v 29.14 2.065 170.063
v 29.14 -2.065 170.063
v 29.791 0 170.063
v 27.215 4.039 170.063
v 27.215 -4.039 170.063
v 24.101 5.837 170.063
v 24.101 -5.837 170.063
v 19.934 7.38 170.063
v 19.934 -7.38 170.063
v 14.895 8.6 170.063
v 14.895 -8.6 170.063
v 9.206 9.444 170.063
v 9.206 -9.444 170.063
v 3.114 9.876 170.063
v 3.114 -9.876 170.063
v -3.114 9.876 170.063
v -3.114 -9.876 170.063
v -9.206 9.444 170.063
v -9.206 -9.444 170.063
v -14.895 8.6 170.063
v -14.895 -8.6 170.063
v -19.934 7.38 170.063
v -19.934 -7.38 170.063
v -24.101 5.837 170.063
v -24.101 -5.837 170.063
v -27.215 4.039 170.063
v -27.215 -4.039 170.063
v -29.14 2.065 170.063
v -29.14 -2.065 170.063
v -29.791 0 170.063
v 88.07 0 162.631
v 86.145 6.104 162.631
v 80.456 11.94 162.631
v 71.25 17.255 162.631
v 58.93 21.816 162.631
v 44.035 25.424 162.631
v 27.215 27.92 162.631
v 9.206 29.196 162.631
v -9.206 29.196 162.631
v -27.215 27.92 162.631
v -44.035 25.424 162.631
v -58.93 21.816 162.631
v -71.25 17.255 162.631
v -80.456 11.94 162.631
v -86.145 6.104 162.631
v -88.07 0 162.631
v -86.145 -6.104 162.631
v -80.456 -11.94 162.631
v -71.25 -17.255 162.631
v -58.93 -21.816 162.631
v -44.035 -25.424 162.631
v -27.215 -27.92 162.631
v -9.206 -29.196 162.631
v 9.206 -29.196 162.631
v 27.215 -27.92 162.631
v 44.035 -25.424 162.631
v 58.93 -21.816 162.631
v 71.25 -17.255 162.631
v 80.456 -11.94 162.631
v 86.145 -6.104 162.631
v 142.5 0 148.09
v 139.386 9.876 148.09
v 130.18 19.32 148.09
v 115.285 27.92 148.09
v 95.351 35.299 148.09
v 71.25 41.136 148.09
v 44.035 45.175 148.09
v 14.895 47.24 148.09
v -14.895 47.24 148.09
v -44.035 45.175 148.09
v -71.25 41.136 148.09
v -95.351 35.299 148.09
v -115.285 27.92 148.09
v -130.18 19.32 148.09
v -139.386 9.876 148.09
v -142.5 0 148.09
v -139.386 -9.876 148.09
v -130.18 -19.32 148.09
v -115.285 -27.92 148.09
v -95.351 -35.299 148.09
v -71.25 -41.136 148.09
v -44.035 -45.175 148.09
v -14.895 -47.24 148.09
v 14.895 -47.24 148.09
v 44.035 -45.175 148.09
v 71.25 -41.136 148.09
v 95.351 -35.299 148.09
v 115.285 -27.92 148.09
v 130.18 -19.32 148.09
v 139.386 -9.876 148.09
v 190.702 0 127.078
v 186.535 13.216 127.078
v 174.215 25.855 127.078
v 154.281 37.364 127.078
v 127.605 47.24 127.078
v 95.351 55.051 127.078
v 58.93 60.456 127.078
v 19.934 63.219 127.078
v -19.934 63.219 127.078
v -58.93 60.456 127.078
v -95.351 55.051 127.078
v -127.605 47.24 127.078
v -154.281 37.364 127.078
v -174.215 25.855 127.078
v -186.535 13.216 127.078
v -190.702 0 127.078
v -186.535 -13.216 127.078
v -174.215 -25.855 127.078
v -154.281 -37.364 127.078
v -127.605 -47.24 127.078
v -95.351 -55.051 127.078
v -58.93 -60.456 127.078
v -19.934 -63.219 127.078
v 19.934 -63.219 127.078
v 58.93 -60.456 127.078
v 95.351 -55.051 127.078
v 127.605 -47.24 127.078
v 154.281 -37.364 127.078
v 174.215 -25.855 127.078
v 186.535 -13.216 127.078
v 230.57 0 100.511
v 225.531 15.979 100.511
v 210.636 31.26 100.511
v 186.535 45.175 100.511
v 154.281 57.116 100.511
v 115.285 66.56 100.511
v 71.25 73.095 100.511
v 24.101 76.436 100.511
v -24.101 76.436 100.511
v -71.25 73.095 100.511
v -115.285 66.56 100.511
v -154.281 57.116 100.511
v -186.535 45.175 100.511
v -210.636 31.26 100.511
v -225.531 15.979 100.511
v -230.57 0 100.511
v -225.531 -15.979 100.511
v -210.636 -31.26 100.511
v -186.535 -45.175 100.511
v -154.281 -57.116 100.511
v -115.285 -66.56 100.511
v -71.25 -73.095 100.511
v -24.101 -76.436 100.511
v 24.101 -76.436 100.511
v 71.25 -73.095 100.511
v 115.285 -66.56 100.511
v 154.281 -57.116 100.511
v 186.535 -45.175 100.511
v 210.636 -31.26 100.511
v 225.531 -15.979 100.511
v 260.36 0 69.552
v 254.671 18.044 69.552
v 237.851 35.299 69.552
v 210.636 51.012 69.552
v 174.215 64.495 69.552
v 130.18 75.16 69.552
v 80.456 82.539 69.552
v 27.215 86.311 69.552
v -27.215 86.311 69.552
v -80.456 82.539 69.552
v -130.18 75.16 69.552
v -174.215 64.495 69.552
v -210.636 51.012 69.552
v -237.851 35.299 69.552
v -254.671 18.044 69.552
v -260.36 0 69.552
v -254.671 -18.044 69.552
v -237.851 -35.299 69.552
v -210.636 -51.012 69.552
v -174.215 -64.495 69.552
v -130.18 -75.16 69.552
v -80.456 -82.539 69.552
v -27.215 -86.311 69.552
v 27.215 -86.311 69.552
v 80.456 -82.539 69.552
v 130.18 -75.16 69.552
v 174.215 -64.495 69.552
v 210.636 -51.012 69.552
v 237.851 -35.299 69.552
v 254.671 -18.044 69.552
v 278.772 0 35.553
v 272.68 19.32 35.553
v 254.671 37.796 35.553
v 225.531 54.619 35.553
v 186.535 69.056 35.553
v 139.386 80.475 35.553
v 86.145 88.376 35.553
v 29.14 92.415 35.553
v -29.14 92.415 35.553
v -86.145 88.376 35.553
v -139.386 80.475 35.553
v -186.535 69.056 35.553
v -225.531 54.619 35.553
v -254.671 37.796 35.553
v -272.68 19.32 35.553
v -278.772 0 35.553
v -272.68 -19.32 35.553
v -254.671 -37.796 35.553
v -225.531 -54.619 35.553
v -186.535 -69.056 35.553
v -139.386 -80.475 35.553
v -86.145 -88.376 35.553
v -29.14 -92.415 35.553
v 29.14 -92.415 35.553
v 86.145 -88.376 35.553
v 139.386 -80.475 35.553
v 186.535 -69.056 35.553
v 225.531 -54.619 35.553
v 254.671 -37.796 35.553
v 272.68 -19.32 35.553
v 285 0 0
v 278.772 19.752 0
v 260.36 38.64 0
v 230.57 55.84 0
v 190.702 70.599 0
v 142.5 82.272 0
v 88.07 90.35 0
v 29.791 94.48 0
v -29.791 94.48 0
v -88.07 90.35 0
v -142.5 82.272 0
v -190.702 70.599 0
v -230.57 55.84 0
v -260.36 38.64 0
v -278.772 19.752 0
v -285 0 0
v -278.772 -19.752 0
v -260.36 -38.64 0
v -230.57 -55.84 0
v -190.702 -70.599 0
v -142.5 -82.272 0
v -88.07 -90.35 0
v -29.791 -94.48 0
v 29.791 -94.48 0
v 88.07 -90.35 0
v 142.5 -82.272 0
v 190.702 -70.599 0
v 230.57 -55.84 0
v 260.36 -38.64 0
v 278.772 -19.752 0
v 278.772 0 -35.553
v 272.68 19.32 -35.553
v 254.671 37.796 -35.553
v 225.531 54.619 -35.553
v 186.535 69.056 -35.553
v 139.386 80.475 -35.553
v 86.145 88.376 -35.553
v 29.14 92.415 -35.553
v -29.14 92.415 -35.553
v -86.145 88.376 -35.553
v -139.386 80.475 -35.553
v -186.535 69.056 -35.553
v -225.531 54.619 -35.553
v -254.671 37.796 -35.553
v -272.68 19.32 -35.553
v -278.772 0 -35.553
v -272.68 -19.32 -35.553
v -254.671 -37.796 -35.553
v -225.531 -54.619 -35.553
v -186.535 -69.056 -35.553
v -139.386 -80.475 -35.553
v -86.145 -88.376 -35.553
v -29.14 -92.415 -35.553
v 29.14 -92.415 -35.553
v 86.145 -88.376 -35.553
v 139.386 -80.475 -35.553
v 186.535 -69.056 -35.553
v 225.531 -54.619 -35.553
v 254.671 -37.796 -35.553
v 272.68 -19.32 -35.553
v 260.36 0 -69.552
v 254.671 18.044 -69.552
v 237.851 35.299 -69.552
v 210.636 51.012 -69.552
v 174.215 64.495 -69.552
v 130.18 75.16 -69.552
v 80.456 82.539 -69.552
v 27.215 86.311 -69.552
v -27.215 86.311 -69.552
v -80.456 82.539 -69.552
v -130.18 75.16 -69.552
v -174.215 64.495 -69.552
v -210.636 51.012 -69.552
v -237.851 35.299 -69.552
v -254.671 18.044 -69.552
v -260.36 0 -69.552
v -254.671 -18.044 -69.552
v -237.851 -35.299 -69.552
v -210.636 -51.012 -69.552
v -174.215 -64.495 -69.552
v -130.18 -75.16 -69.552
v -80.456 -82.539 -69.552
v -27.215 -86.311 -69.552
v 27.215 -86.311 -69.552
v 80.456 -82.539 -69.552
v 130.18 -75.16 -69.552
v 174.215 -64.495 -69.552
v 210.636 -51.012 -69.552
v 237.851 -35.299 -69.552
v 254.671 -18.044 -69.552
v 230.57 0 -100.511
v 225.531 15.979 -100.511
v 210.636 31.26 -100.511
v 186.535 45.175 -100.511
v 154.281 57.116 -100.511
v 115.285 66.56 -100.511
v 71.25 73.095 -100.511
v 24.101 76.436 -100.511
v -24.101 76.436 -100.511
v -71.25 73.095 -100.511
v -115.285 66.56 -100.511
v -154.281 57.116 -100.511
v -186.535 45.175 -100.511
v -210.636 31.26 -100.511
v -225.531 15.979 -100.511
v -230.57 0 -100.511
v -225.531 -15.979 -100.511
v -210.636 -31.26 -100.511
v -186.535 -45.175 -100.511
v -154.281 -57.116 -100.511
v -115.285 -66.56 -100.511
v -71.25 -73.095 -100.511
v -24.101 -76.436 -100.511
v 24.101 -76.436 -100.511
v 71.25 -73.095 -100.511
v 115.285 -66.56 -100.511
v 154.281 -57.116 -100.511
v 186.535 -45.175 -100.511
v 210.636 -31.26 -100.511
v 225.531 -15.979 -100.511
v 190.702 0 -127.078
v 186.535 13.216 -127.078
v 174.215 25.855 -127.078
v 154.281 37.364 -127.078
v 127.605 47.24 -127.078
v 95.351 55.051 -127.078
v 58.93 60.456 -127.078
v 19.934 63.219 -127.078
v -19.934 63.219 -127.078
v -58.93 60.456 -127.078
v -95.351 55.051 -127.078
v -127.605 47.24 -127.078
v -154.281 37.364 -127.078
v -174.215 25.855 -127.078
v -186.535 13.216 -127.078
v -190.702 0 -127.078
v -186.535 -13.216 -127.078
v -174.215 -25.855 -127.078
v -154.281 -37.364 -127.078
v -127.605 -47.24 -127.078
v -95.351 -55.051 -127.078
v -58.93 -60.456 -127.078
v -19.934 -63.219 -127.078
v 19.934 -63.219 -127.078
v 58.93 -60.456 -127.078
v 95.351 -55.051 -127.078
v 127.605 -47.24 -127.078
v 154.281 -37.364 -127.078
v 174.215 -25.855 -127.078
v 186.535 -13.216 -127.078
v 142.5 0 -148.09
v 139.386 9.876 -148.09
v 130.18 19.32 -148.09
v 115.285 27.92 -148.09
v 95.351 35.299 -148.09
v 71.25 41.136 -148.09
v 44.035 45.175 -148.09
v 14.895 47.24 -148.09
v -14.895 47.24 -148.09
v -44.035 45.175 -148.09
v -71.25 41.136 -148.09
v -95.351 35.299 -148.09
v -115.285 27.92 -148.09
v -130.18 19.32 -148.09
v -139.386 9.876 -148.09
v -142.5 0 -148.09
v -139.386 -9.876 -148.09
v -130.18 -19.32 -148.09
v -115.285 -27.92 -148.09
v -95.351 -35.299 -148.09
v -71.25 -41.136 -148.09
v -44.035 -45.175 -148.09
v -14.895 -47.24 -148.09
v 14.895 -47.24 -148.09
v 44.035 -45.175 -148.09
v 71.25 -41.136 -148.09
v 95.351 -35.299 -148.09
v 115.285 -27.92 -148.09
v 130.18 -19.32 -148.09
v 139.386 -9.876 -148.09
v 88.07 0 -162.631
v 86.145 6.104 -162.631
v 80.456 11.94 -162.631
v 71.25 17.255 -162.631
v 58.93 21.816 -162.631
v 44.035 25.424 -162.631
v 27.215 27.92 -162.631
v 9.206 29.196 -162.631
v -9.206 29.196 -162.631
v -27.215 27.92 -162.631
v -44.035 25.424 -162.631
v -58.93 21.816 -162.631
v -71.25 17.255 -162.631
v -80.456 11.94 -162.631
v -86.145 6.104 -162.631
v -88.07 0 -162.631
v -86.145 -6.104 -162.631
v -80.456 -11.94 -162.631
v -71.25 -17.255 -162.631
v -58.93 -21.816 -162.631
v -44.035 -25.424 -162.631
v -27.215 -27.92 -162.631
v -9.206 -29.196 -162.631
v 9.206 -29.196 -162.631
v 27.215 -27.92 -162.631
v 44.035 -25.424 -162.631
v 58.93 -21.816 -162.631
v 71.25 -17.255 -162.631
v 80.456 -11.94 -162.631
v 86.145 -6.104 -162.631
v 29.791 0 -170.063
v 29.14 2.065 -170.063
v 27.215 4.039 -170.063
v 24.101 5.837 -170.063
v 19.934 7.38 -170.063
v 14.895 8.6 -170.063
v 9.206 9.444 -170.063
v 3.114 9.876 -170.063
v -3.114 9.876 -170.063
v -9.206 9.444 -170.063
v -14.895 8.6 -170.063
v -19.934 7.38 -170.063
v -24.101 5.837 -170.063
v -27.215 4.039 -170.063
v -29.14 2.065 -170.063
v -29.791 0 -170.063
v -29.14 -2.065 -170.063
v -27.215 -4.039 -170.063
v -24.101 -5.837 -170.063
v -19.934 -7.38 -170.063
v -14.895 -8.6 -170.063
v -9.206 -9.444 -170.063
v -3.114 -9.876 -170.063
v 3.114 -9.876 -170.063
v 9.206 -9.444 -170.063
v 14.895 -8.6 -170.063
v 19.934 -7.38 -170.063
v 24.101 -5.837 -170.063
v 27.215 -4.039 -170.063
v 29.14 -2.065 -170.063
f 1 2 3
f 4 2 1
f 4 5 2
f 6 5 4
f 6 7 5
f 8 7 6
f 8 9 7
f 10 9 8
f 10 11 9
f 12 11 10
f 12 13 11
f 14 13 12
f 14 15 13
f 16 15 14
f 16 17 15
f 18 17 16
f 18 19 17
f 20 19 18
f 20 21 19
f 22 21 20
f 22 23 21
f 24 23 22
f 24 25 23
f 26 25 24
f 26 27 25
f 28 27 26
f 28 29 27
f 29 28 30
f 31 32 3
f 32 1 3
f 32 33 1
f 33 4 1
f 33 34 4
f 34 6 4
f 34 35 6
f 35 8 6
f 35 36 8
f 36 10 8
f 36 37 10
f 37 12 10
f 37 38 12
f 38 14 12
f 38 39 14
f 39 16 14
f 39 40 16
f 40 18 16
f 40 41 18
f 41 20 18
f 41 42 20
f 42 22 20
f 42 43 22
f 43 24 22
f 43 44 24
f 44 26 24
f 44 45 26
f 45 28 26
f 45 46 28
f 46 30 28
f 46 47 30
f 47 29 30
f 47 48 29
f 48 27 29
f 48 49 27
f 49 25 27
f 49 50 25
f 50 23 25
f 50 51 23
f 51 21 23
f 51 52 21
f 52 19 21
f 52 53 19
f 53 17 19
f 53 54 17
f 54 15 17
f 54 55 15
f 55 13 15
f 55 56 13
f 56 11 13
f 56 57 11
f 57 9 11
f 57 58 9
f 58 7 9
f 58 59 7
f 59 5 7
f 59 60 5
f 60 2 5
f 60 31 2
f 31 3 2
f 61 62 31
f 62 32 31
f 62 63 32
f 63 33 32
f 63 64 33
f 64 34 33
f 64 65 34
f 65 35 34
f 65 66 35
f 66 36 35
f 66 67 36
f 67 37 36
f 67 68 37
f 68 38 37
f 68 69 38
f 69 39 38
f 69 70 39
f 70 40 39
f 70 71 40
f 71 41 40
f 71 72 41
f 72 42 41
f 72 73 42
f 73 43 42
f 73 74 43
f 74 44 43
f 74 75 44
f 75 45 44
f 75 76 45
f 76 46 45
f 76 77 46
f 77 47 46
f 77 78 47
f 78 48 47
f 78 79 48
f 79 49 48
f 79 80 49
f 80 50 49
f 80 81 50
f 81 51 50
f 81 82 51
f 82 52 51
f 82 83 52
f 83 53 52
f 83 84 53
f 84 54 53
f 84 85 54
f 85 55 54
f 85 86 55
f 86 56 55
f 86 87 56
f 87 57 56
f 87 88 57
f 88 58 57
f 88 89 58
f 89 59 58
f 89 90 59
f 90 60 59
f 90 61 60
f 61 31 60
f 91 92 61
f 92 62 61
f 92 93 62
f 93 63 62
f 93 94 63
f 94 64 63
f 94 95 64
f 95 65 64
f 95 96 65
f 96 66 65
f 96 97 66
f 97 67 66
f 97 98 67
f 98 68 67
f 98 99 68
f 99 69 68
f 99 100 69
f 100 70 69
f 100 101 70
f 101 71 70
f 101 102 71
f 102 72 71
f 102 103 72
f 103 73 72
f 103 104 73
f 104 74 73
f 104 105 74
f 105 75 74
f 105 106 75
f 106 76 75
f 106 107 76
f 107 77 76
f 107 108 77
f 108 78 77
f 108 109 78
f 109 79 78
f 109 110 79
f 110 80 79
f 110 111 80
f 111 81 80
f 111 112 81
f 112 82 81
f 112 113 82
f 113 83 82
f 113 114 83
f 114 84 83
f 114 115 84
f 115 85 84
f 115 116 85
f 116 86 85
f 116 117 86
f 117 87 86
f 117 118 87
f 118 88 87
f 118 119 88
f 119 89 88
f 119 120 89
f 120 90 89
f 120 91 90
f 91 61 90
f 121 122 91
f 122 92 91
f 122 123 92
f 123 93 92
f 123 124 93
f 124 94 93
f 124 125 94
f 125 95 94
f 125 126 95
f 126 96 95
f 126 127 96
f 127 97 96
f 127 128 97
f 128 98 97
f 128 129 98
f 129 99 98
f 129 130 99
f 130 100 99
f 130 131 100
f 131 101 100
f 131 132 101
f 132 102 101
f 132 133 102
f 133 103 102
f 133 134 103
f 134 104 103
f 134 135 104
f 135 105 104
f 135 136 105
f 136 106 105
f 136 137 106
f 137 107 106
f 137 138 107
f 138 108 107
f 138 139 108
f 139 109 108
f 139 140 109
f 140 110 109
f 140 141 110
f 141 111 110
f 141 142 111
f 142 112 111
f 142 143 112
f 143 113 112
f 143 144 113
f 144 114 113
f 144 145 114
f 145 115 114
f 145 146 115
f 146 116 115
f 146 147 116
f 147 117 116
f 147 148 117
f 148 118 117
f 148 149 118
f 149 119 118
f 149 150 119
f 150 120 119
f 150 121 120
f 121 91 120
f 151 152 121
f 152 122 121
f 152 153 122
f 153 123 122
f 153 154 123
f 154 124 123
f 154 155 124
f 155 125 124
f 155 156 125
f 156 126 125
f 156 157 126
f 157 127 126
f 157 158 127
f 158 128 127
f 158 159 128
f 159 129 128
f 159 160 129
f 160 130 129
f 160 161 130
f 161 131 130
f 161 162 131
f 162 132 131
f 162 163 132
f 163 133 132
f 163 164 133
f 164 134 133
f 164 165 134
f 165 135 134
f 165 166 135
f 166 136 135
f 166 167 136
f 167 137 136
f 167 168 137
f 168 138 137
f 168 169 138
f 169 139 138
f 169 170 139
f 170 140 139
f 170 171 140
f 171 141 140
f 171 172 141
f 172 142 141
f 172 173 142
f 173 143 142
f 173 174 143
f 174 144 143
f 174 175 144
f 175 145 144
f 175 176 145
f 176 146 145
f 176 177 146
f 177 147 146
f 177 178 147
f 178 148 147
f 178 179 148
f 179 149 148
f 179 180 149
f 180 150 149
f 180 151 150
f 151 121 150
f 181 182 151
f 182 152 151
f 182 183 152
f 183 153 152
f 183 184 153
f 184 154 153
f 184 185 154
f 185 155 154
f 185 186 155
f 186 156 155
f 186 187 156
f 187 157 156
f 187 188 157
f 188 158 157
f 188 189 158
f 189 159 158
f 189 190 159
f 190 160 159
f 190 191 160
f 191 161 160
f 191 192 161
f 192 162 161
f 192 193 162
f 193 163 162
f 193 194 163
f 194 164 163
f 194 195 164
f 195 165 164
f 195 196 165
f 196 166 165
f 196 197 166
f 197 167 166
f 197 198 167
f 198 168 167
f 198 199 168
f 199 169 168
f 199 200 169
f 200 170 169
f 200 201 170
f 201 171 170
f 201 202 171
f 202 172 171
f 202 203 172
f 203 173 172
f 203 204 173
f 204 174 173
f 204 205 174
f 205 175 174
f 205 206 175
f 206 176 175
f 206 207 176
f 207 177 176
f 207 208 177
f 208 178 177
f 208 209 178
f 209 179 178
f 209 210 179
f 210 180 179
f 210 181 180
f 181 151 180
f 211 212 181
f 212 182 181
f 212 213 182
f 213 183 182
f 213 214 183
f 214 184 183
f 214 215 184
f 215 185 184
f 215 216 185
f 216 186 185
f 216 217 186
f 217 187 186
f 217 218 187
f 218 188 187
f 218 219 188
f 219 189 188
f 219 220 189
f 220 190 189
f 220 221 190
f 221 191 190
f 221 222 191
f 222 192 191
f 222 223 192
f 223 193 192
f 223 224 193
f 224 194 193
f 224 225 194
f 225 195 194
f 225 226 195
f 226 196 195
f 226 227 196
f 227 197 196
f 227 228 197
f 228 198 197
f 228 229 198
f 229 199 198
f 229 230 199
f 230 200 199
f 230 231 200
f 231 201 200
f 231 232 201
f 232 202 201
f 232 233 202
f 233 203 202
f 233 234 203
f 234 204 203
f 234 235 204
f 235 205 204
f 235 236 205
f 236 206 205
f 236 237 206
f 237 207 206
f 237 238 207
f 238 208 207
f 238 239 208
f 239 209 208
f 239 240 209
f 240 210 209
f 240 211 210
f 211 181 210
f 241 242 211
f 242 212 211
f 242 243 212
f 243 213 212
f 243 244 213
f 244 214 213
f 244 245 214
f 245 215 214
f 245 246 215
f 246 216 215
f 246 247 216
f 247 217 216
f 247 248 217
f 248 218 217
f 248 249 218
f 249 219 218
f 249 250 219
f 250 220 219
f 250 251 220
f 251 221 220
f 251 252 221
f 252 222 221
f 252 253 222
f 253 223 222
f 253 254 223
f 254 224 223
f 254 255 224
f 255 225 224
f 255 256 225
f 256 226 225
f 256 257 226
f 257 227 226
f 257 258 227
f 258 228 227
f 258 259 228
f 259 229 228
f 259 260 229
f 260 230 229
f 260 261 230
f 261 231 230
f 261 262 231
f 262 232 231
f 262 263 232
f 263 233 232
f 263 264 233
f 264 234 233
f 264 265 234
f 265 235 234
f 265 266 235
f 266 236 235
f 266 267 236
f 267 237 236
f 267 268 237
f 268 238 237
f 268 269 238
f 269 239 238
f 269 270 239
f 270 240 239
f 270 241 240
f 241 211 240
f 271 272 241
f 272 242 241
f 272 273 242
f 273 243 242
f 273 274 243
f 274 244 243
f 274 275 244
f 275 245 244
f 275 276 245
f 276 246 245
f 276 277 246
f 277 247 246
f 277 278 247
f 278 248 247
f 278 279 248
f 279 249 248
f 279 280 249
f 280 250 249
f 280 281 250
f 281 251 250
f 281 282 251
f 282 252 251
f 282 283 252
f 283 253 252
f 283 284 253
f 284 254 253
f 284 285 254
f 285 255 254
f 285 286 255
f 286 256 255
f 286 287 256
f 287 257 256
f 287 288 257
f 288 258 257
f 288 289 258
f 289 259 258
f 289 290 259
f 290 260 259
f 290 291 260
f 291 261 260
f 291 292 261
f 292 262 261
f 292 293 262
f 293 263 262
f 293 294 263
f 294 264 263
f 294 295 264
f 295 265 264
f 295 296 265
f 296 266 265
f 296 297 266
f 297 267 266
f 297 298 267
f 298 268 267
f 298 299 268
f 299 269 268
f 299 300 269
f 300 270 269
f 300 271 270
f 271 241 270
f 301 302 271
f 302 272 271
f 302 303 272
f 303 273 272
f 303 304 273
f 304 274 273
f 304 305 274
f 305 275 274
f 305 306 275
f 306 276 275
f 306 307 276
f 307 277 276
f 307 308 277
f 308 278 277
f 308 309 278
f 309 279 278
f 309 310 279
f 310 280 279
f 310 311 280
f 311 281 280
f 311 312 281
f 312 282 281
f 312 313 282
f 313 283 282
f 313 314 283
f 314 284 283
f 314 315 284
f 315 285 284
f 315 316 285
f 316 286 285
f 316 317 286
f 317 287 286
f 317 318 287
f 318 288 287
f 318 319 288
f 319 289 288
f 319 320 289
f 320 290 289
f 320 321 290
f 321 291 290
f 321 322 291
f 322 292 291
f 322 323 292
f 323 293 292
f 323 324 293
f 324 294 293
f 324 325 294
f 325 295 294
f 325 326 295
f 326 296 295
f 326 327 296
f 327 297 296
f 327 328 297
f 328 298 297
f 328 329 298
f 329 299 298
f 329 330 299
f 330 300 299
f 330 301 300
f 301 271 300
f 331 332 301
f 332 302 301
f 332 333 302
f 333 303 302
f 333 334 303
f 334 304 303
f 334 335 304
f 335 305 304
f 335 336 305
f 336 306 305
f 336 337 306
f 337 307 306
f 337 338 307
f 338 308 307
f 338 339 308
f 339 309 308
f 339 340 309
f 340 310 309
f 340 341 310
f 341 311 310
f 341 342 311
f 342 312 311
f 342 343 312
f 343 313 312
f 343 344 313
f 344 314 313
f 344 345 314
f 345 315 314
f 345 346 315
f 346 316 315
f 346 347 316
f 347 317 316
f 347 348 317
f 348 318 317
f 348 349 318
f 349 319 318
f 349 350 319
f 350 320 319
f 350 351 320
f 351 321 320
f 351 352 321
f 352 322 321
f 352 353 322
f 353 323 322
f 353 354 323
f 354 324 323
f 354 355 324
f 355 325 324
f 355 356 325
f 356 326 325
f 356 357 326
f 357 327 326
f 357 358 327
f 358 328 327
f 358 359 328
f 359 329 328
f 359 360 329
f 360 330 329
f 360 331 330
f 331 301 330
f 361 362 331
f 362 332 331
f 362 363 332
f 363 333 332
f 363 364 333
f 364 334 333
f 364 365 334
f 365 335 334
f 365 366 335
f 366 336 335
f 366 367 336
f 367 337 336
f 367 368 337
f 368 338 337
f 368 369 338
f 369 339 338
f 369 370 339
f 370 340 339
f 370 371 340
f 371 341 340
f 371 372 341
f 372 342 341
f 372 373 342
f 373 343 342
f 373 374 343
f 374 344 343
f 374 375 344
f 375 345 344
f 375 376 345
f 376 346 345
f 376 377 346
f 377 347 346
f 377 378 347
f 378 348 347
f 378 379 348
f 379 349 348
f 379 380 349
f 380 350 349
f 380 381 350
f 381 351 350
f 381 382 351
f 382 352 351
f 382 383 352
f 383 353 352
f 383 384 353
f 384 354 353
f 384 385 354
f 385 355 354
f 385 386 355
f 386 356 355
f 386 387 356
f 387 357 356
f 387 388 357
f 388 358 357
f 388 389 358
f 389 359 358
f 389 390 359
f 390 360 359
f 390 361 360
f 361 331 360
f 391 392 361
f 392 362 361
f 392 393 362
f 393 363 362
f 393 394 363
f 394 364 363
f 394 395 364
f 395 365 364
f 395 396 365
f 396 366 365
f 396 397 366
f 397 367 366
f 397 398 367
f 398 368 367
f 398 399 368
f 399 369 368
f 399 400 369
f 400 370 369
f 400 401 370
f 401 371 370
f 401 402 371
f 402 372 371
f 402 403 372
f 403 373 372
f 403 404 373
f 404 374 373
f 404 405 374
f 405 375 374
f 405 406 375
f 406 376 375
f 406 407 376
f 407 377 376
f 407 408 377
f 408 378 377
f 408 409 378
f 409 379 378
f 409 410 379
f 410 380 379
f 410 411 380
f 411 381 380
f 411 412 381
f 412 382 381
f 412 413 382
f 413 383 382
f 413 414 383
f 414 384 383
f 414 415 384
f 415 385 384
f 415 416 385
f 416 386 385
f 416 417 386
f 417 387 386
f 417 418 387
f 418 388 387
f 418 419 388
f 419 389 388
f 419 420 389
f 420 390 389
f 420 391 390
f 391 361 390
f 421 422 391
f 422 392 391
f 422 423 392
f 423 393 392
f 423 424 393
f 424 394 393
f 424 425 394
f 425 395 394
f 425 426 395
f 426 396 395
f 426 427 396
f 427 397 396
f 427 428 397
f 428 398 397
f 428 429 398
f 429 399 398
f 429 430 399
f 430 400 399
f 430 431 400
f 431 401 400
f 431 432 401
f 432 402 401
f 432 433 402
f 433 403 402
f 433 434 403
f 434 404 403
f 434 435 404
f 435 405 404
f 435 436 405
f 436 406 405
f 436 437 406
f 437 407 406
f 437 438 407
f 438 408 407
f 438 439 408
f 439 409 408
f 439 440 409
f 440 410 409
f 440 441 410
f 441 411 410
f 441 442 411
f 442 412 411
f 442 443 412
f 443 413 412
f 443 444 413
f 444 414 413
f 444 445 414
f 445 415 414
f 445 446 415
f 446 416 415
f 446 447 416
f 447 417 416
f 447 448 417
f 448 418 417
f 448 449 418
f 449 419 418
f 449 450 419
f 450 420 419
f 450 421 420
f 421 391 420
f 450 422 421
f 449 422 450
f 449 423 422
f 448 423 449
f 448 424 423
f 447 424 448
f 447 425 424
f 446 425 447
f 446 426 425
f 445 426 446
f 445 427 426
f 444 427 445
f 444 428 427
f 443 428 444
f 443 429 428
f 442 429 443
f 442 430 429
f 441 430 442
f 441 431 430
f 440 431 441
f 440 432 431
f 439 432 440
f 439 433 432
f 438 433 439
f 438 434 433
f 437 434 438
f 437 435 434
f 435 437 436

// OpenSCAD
// Generated by SolidPython 1.0.1 on 2020-07-29 00:46:51


scale(v = [15, 5, 9]) {
	sphere(r = 19);
}
/***********************************************
*********      SolidPython code:      **********
************************************************
 
# import packages: SolidPython
from solid import *
from solid.utils import *
from itertools import chain, combinations, permutations


class Resize:

    def __init__(self, scad_file):
        self.scad_file = scad_file
        #self.scad_file = import_scad(scad_file)
        # cone/cylinder param:
        self.r1 = 0
        self.r2 = 0
        self.h = 0
        # rectangular prism param:
        self.w = 0
        self.l = 0
        # ellipse param:
        self.r = 0

    # import OpenScad code (file name corresponds to shape)


    # classify shape + parameters
    def assign(self, param1, param2, param3):
        if self.scad_file == 'cone.scad':
            self.r1 = param1
            self.r2 = param2
            self.h = param3
        elif self.scad_file == 'cylinder.scad':
            self.r1 = param1
            self.r2 = param2
            self.h = param3
        elif self.scad_file == 'rectangularPrism.scad':
            self.h = param1
            self.l = param2
            self.w = param3
        else:
            self.r = param1
            self.h = param2

    # resize parameters
    def iterate(self):
        x = range(3, 20, 2)
        i = 1
        if self.scad_file == 'cone.scad':
            tempList = list(permutations(x, 2))
            for temp in tempList:
                param1 = temp[0]
                param2 = temp[1]
                filepath = 'produced_scad_files/' + 'cone' + str(param1) + '_' + str(param2) + '_' + '.scad'
                scad_render_to_file(cylinder(h=param1, r1=param2, r2=0), filepath)

        elif self.scad_file == 'cylinder.scad':
            tempList = list(permutations(x, 3))
            for temp in tempList:
                param1 = temp[0]
                param2 = temp[1]
                filepath = 'produced_scad_files/' + 'cylinder' + str(param1) + '_' + str(param2) + '_' + '.scad'
                scad_render_to_file(cylinder(h=param1, r1=param2, r2=param2), filepath)

        elif self.scad_file == 'rectangularPrism.scad':
            tempList = list(permutations(x, 3))
            for temp in tempList:
                param1 = temp[0]
                param2 = temp[1]
                param3 = temp[2]
                filepath = 'produced_scad_files/' + 'rectangularPrism' + str(param1) + '_' + str(param2) + '_' + str(
                    param3) + '.scad'
                scad_render_to_file(cube(size=(param1, param2, param3)), filepath)

        elif self.scad_file == 'ellipse.scad':
            tempList = list(permutations(x, 4))
            for temp in tempList:
                param1 = temp[0]
                param2 = temp[1]
                param3 = temp[2]
                param4 = temp[3]
                filepath = 'produced_scad_files/' + 'ellipse' + str(param1) + '_' + str(param2) + '_' + str(param3) + '_' + str(param4) + '.scad'
                scad_render_to_file(scale([param1, param2, param3])(sphere(r=param4)), filepath)

    def render_to_scadfile(self):
        scad_render_to_file(scad, 'example.scad') 
 
************************************************/
